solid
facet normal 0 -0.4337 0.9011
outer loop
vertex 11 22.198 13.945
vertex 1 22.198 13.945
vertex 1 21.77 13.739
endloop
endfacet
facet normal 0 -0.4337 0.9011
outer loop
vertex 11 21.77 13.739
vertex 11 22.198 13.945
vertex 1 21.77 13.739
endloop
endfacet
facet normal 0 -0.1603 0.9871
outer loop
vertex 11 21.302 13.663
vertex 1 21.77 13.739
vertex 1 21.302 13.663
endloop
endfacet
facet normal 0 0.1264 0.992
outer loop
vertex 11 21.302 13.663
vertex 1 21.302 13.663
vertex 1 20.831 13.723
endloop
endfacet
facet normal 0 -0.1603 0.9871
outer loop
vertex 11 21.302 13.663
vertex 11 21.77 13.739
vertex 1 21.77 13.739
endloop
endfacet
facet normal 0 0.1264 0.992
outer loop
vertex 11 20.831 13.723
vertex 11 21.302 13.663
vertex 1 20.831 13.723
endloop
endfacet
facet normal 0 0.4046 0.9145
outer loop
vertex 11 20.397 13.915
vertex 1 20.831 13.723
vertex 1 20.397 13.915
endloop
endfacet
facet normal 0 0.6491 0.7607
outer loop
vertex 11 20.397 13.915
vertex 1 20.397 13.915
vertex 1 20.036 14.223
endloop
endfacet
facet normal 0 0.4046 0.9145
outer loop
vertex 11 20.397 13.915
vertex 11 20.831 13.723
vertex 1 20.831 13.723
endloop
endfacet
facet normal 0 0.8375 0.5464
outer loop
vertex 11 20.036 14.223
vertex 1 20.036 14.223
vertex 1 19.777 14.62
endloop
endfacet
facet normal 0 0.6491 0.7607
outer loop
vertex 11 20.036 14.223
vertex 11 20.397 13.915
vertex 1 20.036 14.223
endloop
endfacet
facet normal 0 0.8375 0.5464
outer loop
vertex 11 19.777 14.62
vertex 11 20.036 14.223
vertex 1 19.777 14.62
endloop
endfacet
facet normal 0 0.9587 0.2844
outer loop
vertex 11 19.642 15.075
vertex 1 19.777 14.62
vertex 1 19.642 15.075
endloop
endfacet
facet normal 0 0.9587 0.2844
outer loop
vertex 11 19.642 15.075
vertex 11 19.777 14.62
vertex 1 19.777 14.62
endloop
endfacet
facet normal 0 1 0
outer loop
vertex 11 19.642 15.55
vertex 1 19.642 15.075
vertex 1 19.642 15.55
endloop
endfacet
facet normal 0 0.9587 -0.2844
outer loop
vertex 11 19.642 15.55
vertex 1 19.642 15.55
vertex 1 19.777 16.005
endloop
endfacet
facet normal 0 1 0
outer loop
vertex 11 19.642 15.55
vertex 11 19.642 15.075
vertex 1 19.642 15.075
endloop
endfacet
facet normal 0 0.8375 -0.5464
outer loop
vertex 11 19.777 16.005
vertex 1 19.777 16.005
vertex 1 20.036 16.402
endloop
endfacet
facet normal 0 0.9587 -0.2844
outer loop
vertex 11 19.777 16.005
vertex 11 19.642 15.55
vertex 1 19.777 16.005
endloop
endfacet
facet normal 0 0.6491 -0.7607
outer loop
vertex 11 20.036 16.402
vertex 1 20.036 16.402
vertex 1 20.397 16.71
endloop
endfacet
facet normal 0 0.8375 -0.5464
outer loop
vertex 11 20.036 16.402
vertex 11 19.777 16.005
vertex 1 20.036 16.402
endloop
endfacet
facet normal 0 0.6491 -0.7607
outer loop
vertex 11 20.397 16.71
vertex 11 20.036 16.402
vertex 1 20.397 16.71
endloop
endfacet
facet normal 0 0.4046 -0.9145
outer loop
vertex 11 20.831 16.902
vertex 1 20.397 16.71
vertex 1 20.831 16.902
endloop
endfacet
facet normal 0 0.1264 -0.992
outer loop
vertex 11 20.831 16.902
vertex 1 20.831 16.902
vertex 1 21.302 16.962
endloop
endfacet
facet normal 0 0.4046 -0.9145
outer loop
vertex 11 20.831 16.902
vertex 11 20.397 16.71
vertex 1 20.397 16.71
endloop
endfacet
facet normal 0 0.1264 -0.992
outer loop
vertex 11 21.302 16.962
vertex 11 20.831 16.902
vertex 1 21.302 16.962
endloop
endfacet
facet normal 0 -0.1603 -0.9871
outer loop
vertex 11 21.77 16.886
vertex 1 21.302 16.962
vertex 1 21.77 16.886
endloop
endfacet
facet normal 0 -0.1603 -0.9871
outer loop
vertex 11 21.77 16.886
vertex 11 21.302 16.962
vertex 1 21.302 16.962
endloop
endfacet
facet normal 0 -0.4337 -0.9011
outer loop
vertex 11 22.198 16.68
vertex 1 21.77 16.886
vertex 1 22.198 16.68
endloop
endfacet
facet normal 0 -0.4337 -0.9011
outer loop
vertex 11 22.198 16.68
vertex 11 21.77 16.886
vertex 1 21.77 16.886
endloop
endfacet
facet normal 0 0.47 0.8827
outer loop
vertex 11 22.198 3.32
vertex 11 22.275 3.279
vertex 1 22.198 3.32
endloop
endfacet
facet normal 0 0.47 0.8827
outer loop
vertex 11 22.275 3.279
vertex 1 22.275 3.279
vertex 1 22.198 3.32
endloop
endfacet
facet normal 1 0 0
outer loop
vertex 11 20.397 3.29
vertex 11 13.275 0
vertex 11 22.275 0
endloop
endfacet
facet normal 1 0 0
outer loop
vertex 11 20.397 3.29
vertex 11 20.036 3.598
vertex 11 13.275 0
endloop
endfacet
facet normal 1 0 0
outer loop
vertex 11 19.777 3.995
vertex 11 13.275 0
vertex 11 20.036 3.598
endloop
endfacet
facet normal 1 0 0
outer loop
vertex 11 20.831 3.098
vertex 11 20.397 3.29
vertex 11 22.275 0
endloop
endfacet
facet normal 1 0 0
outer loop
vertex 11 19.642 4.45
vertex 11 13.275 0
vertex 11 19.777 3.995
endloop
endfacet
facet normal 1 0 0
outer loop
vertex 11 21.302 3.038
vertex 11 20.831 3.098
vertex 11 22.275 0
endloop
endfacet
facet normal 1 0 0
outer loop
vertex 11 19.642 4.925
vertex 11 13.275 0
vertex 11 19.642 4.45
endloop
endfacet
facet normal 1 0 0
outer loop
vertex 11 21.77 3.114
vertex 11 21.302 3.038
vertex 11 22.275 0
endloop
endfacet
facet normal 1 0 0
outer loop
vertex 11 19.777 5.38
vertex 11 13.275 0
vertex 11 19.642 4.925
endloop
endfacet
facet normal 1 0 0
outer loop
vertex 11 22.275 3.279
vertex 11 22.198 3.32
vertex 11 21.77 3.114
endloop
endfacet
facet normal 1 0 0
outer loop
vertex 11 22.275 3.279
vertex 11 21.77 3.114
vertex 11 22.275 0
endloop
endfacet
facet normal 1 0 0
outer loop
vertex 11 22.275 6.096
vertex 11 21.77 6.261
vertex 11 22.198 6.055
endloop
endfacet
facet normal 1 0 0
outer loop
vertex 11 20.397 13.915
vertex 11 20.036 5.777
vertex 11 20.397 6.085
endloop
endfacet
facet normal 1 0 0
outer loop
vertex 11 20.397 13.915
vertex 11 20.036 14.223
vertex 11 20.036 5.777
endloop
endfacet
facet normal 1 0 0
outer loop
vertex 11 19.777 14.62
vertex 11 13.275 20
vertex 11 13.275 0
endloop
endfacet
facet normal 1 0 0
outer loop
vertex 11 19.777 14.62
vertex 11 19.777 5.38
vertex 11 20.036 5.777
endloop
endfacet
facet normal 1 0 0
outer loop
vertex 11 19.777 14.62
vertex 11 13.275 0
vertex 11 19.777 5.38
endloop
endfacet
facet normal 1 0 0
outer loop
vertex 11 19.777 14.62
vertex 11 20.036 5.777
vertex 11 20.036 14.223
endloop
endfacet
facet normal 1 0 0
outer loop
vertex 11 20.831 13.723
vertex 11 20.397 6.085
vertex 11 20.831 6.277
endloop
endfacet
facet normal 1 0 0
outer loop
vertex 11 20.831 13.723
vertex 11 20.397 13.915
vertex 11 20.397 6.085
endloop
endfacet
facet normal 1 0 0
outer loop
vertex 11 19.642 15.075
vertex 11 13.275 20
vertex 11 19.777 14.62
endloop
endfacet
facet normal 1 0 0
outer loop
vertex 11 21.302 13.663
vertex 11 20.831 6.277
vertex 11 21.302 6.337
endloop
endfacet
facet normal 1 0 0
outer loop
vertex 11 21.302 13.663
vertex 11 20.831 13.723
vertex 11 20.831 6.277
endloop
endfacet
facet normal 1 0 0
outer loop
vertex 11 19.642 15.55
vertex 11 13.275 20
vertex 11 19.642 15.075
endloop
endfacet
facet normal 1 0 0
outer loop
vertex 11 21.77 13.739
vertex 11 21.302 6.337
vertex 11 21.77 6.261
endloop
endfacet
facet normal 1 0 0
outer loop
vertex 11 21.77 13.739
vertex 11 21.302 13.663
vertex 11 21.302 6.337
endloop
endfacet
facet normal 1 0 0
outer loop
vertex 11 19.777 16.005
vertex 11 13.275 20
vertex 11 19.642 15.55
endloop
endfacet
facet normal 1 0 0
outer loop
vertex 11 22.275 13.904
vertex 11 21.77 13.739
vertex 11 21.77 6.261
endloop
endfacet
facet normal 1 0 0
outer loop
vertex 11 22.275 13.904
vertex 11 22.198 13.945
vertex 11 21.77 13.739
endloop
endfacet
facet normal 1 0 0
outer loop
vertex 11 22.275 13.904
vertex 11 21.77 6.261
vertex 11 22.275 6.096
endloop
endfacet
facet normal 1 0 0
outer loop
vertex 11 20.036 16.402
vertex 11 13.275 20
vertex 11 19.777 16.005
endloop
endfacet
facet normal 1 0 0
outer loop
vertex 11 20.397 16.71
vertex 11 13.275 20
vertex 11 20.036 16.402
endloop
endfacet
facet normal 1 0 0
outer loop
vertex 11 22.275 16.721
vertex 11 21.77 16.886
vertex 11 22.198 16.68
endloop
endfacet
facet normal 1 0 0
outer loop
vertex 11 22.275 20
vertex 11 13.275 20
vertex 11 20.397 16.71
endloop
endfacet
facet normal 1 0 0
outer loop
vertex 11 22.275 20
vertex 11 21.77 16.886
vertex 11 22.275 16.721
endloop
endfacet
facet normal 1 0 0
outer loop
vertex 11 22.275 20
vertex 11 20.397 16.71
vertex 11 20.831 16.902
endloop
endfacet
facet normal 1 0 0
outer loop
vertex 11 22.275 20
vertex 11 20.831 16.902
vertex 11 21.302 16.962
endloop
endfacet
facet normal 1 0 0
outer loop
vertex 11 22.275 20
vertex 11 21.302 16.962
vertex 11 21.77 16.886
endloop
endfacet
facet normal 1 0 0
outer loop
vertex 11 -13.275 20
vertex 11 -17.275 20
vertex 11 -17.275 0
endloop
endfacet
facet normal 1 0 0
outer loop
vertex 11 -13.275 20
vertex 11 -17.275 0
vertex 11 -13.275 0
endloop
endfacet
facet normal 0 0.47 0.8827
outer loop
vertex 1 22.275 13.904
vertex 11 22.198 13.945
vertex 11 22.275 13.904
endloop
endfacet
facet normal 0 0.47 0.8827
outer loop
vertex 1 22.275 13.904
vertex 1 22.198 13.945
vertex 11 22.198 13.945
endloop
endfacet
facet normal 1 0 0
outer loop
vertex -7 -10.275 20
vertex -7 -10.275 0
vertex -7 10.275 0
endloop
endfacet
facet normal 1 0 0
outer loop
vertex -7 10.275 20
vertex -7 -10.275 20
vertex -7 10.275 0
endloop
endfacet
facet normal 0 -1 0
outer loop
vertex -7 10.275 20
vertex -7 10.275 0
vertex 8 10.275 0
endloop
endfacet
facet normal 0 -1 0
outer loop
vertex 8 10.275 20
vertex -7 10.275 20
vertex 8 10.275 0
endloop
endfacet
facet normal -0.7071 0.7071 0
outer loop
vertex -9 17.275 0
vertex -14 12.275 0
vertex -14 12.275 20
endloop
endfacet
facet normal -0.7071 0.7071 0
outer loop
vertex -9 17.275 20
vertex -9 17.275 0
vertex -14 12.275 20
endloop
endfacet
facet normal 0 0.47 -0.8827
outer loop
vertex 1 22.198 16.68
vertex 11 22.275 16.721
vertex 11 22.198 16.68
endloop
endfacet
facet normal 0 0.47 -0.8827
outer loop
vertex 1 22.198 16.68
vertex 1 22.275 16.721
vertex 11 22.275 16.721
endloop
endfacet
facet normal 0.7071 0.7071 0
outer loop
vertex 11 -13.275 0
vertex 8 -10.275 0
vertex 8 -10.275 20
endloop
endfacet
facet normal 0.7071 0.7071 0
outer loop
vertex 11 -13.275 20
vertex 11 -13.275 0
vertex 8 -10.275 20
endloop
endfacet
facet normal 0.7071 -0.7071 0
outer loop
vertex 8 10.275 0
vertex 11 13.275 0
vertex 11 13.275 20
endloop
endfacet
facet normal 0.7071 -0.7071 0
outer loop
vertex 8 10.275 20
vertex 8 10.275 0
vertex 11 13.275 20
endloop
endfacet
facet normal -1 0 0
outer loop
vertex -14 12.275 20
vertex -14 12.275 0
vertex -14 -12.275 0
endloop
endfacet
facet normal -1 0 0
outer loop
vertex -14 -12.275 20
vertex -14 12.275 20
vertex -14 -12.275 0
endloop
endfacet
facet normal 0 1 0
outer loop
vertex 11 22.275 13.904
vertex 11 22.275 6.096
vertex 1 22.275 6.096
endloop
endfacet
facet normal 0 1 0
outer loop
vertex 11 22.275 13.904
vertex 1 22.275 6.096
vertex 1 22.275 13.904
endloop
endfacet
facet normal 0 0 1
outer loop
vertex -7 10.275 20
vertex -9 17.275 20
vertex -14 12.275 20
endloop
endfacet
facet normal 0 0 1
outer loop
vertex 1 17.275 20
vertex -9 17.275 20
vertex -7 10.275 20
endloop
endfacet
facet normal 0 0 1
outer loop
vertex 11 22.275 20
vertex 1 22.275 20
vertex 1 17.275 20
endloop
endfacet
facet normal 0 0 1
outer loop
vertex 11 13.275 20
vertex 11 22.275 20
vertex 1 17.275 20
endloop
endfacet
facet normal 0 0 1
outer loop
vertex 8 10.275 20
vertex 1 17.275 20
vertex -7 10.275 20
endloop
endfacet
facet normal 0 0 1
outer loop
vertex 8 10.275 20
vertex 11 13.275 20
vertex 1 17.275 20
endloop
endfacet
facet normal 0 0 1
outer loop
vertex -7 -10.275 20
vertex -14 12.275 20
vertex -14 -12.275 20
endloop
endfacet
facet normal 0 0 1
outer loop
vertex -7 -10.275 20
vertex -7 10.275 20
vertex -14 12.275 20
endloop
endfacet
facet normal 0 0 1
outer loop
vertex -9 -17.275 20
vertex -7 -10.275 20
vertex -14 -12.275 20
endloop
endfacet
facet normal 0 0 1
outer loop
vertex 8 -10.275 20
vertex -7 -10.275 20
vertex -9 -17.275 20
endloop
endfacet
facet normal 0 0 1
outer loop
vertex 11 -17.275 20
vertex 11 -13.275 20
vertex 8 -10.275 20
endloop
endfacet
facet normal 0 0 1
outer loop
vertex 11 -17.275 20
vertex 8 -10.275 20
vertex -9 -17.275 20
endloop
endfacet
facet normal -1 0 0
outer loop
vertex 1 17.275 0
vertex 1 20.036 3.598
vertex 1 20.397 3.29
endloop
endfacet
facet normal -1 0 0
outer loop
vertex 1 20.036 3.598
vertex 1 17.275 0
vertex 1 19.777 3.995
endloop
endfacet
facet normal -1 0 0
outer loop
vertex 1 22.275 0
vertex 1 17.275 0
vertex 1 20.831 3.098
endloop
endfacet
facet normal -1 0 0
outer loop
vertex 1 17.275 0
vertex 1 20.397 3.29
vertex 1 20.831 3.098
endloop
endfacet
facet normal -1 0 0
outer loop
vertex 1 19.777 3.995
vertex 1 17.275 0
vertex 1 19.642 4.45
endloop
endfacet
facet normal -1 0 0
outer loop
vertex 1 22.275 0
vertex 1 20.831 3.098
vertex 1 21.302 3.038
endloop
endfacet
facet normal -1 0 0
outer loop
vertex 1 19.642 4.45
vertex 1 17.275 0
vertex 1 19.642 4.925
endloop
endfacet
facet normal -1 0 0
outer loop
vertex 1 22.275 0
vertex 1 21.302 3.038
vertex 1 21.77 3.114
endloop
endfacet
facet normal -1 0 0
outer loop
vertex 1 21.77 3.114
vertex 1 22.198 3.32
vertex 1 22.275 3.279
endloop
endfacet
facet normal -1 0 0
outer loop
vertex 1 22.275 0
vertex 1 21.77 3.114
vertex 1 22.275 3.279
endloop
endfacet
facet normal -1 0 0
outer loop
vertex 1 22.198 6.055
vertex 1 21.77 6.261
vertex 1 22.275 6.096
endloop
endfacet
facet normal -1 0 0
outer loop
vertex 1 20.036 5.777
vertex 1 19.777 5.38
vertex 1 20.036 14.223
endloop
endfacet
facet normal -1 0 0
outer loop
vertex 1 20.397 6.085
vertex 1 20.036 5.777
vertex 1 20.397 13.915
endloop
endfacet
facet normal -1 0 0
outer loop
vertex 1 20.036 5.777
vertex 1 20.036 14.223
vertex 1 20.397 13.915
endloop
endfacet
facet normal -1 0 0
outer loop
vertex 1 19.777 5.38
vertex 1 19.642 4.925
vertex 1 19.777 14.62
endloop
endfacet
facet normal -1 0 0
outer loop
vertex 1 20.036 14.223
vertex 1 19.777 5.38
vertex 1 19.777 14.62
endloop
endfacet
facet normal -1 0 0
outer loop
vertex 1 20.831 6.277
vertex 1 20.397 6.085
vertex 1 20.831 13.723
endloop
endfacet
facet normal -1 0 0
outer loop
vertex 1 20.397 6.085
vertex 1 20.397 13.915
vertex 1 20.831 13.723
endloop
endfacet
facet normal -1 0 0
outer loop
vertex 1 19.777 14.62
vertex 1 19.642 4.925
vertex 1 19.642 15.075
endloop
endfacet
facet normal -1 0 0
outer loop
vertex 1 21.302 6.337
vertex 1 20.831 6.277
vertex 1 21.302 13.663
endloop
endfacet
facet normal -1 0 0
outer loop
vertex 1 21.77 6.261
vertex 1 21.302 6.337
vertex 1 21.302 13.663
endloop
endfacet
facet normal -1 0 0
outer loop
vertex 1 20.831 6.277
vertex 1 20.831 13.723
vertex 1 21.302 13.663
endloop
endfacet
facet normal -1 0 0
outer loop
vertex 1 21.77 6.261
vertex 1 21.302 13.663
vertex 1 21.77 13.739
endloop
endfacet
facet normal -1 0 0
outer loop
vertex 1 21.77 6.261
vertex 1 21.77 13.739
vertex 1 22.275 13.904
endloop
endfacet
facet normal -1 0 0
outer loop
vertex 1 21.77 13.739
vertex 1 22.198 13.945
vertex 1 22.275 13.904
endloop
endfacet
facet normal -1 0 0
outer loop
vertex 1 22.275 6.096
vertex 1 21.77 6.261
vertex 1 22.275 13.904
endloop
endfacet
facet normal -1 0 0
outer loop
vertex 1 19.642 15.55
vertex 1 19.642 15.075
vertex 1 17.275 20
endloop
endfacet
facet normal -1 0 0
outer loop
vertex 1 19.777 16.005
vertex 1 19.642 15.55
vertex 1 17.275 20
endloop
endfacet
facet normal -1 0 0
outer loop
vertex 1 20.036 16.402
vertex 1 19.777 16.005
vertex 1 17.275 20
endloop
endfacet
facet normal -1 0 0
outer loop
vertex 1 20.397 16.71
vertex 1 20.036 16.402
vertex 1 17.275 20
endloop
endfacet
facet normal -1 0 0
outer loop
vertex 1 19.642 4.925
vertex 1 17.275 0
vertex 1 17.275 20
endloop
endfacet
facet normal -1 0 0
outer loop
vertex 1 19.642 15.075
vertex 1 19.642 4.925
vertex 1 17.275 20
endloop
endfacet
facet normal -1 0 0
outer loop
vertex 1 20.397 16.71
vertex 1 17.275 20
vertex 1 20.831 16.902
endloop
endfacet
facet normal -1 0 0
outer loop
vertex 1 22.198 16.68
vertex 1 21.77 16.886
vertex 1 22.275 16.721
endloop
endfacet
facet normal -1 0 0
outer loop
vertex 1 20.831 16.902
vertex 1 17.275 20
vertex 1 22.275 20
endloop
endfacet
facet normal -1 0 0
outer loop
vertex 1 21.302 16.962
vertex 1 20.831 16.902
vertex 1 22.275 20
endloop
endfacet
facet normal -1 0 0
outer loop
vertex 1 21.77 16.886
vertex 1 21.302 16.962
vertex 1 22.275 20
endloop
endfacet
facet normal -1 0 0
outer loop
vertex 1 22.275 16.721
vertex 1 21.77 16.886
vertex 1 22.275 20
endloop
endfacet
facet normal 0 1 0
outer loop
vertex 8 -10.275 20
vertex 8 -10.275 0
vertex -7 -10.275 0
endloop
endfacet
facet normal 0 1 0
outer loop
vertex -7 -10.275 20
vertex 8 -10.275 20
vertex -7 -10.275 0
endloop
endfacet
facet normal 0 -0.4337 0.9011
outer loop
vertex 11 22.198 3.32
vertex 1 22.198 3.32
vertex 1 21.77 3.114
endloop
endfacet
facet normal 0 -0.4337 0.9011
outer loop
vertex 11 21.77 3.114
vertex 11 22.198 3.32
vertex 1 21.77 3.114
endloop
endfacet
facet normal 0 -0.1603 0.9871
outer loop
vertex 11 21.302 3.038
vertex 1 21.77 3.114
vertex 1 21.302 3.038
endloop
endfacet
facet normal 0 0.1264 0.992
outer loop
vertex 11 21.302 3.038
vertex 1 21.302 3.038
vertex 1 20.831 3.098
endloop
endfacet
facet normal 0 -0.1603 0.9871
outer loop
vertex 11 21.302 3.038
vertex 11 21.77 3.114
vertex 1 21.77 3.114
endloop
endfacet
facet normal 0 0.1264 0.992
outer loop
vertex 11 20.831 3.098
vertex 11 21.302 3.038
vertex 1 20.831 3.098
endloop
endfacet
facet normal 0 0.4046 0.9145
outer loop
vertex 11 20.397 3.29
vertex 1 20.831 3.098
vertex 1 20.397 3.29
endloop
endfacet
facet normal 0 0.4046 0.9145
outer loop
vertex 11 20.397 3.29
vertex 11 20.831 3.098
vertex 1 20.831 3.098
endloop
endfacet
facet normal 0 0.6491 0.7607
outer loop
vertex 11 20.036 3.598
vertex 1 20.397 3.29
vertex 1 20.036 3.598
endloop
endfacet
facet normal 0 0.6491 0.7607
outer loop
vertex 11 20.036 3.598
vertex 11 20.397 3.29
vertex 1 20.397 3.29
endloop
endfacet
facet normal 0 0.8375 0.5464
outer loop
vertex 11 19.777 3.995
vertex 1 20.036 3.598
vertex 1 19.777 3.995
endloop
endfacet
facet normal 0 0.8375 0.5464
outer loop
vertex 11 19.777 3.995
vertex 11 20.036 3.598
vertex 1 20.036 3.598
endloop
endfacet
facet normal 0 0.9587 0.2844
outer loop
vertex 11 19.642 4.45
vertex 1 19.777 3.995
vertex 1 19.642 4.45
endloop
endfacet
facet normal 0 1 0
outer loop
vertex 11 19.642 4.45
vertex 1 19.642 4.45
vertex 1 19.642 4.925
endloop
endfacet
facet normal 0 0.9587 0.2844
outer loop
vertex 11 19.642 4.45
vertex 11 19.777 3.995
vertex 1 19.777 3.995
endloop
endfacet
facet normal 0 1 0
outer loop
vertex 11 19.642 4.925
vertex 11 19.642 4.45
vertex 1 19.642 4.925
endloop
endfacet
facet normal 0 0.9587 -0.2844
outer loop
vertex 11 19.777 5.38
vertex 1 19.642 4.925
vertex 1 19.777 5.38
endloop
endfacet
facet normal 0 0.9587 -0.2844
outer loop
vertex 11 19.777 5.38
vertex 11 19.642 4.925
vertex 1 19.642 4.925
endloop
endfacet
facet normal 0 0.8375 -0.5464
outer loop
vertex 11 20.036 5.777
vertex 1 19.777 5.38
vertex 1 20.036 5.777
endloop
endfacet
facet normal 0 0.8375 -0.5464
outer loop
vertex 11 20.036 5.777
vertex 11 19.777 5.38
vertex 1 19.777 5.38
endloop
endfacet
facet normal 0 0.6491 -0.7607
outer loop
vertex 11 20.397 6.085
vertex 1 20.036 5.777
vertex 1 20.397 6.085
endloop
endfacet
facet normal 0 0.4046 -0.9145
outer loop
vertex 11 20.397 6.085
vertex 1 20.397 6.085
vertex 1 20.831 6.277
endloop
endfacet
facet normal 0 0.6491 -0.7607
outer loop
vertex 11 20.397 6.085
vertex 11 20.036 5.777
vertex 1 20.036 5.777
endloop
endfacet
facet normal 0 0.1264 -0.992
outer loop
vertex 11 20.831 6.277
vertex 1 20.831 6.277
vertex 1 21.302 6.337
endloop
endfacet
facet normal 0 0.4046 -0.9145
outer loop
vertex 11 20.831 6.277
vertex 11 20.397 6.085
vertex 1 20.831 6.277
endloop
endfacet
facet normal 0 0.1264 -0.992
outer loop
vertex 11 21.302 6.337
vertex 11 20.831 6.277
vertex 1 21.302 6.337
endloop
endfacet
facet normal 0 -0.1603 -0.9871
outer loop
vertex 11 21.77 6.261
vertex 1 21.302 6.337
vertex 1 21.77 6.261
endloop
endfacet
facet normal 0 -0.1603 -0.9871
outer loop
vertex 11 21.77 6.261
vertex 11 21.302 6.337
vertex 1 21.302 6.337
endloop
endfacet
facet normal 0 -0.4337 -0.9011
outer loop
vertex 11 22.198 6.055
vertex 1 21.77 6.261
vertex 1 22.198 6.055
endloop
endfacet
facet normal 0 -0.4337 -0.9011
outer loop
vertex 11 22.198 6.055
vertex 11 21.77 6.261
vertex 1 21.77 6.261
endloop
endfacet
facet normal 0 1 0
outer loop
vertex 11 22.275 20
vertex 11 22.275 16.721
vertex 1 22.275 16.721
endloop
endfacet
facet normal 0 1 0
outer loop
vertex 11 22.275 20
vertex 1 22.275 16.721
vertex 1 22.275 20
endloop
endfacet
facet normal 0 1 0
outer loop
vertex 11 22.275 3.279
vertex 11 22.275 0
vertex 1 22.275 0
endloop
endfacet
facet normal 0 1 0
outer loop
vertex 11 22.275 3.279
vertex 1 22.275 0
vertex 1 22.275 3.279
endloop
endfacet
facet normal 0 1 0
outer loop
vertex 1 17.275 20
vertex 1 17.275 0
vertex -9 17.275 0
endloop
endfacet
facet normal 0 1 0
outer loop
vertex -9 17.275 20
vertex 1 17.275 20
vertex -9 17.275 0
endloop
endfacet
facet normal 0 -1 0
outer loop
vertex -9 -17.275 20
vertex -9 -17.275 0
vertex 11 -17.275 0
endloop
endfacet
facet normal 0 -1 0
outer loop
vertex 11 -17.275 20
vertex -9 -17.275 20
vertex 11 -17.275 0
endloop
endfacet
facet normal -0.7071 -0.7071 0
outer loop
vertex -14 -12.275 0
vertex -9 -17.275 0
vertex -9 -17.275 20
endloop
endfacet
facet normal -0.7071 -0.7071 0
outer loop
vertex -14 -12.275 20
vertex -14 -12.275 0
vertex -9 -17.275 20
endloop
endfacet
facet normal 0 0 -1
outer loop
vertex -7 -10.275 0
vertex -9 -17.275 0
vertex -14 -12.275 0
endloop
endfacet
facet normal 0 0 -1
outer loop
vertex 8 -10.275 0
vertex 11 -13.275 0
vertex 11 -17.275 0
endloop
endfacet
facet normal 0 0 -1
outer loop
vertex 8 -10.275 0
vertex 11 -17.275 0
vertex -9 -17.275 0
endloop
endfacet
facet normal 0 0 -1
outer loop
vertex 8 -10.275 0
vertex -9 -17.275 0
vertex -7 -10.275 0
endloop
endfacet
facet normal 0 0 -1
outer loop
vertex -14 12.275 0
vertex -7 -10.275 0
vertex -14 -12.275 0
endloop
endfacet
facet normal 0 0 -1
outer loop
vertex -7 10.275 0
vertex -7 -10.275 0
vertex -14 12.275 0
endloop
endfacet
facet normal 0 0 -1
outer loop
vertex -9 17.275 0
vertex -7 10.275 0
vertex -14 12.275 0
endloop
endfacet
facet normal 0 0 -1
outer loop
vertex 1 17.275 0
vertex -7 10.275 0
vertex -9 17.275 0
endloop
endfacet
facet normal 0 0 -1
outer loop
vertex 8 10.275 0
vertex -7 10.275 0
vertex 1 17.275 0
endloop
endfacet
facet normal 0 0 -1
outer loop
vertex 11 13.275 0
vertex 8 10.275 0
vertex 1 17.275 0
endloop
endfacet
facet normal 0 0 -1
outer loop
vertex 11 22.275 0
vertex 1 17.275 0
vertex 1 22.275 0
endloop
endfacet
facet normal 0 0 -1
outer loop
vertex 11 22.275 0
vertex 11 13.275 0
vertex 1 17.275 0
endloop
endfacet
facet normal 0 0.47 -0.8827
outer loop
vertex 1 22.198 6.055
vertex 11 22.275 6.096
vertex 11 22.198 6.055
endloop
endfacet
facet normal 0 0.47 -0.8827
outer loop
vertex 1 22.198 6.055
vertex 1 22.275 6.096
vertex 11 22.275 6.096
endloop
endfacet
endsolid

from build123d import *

# Parameters (mm, degrees)
F1_DEPTH    = 20
F3_DEPTH    = 10
F4_SIZE     = 3
F5_T1_DEPTH = 10.4919836734
F6_SIZE     = 5


# Not quite as in the source:
# - a fillet or chamfer that OpenCascade refuses, or shapes differently, is made with other operations: its cross-section is extruded or revolved along the edge and cut away or added


with BuildPart() as f1:
    # F0 (on Top) → F1 (new body)
    with BuildSketch(Plane.XY):
        Polygon((11, 17.275), (-14, 17.275), (-14, -17.275), (11, -17.275), (11, -10.275), (-7, -10.275), (-7, 10.275), (11, 10.275), align=None)
    extrude(amount=F1_DEPTH)

    # F2 (on face) → F3 (join)
    with BuildSketch(Plane.YZ.offset(11)):
        with BuildLine():
            ThreePointArc((22.275, 14), (19.625, 15.3124404748), (22.275, 16.6248809497))
            Line((22.275, 16.6248809497), (22.275, 20))
            Line((22.275, 20), (17.275, 20))
            Line((17.275, 20), (17.275, 0))
            Line((17.275, 0), (22.275, 0))
            Line((22.275, 0), (22.275, 3.3751190503))
            ThreePointArc((22.275, 3.3751190503), (19.625, 4.6875595252), (22.275, 6))
            Line((22.275, 6), (22.275, 14))
        make_face()
    extrude(amount=-F3_DEPTH)

    # F4
    f4_edges = [f1.edges().sort_by_distance(p)[0] for p in [
        (11, 10.275, 10),
        (11, -10.275, 10),
    ]]
    chamfer(f4_edges, length=F4_SIZE)

    # F5: chamfer of 0.1 on 4 edges, made by hand

    # F5_s2 → F5_t1 (cut)
    with BuildSketch(Plane.YZ.offset(0.7540081633)):
        with BuildLine():
            Line((22.2785318644, 16.7232142773), (22.1942442254, 16.6784020049))
            Line((22.1942442254, 16.6784020049), (22.193125709, 16.6767440179))
            ThreePointArc((22.193125709, 16.6767440179), (22.2348996139, 16.6520287441), (22.2737878788, 16.6232901127))
            Line((22.2737878788, 16.6232901127), (22.277, 16.6248809497))
            ThreePointArc((22.277, 16.6248809497), (22.277, 16.6740476135), (22.2805318644, 16.7232142773))
            Line((22.2805318644, 16.7232142773), (22.2785318644, 16.7232142773))
        make_face()
        with BuildLine():
            Line((22.1942442254, 13.9464789448), (22.2785318644, 13.9016666723))
            Line((22.2785318644, 13.9016666723), (22.2805318644, 13.9016666723))
            ThreePointArc((22.2805318644, 13.9016666723), (22.277, 13.9508333362), (22.277, 14))
            Line((22.277, 14), (22.2737878788, 14.0015908369))
            ThreePointArc((22.2737878788, 14.0015908369), (22.2348996139, 13.9728522055), (22.193125709, 13.9481369318))
            Line((22.193125709, 13.9481369318), (22.1942442254, 13.9464789448))
        make_face()
        with BuildLine():
            Line((22.2785318644, 6.0983333277), (22.1942442254, 6.0535210552))
            Line((22.1942442254, 6.0535210552), (22.193125709, 6.0518630682))
            ThreePointArc((22.193125709, 6.0518630682), (22.2348996139, 6.0271477945), (22.2737878788, 5.9984091631))
            Line((22.2737878788, 5.9984091631), (22.277, 6))
            ThreePointArc((22.277, 6), (22.277, 6.0491666638), (22.2805318644, 6.0983333277))
            Line((22.2805318644, 6.0983333277), (22.2785318644, 6.0983333277))
        make_face()
        with BuildLine():
            Line((22.2785318644, 3.2767857227), (22.1942442254, 3.3215979951))
            Line((22.1942442254, 3.3215979951), (22.193125709, 3.3232559821))
            ThreePointArc((22.193125709, 3.3232559821), (22.2348996139, 3.3479712559), (22.2737878788, 3.3767098873))
            Line((22.2737878788, 3.3767098873), (22.277, 3.3751190503))
            ThreePointArc((22.277, 3.3751190503), (22.277, 3.3259523865), (22.2805318644, 3.2767857227))
            Line((22.2805318644, 3.2767857227), (22.2785318644, 3.2767857227))
        make_face()
    extrude(amount=F5_T1_DEPTH, mode=Mode.SUBTRACT)

    # F6
    f6_edges = [f1.edges().sort_by_distance(p)[0] for p in [
        (-14, 17.275, 10),
        (-14, -17.275, 10),
    ]]
    chamfer(f6_edges, length=F6_SIZE)


solid = f1.part
